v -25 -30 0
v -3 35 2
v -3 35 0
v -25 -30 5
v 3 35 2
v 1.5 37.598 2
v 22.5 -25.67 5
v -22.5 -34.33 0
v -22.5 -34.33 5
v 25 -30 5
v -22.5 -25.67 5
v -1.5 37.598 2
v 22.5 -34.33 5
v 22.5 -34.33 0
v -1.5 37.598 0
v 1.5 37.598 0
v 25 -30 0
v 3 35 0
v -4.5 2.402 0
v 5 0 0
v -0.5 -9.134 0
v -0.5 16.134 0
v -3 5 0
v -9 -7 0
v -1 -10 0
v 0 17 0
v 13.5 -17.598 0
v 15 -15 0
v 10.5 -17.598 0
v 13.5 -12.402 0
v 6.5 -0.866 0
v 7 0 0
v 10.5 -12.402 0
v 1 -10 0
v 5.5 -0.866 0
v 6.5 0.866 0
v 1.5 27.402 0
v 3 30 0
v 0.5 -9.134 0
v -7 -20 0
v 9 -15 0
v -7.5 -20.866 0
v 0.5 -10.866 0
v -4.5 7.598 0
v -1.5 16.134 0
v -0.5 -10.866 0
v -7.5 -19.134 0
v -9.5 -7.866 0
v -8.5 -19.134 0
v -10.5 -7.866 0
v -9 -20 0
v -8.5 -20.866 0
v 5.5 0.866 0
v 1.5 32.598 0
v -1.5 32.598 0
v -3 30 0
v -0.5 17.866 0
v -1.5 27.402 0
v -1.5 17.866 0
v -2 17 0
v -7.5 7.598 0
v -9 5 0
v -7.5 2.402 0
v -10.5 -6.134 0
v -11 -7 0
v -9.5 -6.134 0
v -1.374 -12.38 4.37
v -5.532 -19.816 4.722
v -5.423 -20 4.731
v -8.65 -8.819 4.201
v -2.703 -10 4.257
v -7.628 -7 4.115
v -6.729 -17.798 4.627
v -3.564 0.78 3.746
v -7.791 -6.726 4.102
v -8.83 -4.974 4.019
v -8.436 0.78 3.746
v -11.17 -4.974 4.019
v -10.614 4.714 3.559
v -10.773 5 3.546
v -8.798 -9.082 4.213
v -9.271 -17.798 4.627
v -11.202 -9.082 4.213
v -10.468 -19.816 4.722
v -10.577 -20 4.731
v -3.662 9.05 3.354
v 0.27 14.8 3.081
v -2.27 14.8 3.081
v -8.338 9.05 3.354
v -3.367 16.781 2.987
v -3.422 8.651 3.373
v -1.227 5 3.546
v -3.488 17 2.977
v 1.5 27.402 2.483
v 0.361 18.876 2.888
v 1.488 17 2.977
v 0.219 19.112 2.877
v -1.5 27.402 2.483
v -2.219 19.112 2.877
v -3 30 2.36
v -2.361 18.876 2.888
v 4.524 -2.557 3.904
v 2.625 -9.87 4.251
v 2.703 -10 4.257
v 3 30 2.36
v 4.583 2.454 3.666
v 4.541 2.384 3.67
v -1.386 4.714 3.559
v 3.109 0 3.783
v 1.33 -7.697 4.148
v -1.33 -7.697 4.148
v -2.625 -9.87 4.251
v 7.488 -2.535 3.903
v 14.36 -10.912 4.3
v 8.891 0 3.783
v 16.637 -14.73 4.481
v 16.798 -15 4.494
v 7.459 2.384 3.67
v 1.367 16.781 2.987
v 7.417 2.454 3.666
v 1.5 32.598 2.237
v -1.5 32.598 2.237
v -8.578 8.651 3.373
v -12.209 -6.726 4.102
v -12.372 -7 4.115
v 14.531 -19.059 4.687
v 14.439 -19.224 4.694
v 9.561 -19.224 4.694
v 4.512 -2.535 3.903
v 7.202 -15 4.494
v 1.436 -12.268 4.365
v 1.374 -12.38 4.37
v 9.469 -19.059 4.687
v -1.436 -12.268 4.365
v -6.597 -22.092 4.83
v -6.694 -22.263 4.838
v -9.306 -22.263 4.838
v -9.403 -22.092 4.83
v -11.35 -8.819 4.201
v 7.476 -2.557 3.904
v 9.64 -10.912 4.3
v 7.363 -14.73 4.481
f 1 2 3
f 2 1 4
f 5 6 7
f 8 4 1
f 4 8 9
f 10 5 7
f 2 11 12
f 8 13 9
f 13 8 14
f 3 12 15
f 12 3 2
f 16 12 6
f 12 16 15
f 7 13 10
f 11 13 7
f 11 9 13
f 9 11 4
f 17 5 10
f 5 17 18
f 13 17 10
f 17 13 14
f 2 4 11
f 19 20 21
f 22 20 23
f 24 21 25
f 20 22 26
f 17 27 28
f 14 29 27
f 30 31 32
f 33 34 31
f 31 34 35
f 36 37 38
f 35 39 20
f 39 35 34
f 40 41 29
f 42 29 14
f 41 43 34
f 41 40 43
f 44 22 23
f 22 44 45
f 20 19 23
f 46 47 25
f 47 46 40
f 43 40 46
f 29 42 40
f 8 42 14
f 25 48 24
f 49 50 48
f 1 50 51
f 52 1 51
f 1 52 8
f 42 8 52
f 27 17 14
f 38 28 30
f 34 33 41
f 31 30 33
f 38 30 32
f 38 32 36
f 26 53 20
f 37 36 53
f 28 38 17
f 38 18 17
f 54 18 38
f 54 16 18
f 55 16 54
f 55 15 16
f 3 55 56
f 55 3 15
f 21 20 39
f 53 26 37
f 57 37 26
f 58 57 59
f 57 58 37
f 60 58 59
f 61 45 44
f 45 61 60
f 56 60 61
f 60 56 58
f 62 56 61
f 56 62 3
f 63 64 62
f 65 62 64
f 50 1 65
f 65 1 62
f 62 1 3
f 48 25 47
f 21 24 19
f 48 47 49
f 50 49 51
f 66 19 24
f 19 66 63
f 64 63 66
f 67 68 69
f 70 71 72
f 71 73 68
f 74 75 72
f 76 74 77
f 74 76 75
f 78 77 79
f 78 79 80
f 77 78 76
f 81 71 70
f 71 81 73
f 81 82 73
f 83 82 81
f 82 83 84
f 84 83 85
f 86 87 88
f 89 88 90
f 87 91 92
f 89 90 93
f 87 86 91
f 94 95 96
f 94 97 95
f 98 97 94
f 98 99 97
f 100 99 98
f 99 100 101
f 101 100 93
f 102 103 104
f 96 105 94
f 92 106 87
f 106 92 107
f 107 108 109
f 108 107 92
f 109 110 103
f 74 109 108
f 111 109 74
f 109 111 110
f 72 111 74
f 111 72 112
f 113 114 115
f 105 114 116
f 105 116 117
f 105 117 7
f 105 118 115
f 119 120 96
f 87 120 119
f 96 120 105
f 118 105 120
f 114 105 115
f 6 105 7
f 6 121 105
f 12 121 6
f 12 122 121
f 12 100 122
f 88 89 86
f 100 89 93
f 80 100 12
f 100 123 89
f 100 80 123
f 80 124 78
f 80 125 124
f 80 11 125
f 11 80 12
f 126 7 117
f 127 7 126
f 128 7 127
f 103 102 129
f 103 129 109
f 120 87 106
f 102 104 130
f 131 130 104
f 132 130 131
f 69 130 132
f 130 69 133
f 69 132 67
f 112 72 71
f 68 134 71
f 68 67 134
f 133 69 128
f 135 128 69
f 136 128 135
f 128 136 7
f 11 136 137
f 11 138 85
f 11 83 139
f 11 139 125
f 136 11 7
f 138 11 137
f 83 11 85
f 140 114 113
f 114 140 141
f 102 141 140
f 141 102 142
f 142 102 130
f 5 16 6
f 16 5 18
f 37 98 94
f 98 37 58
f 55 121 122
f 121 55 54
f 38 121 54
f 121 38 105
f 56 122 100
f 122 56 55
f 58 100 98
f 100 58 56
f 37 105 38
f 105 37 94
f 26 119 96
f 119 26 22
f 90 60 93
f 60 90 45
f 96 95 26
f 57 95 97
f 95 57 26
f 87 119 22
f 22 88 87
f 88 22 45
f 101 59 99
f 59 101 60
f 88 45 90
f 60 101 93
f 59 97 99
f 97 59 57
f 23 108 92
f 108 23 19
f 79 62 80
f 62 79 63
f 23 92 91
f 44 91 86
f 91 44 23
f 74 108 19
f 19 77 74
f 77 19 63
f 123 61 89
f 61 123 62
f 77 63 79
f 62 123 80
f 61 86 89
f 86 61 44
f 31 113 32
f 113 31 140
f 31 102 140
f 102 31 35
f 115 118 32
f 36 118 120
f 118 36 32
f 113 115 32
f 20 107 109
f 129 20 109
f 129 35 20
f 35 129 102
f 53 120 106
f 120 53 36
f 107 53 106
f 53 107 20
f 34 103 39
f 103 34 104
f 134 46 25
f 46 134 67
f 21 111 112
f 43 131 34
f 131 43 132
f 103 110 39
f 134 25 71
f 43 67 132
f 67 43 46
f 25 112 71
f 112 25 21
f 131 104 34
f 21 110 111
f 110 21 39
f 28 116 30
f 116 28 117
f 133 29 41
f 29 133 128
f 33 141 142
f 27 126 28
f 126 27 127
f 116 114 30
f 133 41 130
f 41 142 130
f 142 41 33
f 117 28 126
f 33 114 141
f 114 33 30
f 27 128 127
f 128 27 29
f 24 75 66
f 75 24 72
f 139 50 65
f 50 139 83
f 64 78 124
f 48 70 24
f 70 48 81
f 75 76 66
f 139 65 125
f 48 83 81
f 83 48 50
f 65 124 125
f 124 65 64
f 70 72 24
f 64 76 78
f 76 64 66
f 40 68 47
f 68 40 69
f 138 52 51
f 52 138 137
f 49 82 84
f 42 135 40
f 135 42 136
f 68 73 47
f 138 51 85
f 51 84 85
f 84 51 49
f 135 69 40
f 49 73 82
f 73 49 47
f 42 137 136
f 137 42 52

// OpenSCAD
$fn=6;
fudge = 0.1;
//color("yellow")

// key fob base
difference(){
hull(){ 
    translate([20,-30,0])
    cylinder(5,5,5);
    translate([0,35,0])
    cylinder(2,3,3);
    translate([-20,-30,0])
    cylinder(5,5,5);    
}
// keyring hole
translate([0,30,0])
cylinder(3,3,3);

translate([-1,17,0])
cylinder(4,1,3);

translate([-6,5,0])
cylinder(4,3,5);

translate([6,0,0])
cylinder(4,1,3);

translate([0,-10,0])
cylinder(5,1,3);

translate([12,-15,0])
cylinder(5,3,5);

translate([-10,-7,0])
cylinder(6,1,3);

translate([-8,-20,0])
cylinder(6,1,3);

}
